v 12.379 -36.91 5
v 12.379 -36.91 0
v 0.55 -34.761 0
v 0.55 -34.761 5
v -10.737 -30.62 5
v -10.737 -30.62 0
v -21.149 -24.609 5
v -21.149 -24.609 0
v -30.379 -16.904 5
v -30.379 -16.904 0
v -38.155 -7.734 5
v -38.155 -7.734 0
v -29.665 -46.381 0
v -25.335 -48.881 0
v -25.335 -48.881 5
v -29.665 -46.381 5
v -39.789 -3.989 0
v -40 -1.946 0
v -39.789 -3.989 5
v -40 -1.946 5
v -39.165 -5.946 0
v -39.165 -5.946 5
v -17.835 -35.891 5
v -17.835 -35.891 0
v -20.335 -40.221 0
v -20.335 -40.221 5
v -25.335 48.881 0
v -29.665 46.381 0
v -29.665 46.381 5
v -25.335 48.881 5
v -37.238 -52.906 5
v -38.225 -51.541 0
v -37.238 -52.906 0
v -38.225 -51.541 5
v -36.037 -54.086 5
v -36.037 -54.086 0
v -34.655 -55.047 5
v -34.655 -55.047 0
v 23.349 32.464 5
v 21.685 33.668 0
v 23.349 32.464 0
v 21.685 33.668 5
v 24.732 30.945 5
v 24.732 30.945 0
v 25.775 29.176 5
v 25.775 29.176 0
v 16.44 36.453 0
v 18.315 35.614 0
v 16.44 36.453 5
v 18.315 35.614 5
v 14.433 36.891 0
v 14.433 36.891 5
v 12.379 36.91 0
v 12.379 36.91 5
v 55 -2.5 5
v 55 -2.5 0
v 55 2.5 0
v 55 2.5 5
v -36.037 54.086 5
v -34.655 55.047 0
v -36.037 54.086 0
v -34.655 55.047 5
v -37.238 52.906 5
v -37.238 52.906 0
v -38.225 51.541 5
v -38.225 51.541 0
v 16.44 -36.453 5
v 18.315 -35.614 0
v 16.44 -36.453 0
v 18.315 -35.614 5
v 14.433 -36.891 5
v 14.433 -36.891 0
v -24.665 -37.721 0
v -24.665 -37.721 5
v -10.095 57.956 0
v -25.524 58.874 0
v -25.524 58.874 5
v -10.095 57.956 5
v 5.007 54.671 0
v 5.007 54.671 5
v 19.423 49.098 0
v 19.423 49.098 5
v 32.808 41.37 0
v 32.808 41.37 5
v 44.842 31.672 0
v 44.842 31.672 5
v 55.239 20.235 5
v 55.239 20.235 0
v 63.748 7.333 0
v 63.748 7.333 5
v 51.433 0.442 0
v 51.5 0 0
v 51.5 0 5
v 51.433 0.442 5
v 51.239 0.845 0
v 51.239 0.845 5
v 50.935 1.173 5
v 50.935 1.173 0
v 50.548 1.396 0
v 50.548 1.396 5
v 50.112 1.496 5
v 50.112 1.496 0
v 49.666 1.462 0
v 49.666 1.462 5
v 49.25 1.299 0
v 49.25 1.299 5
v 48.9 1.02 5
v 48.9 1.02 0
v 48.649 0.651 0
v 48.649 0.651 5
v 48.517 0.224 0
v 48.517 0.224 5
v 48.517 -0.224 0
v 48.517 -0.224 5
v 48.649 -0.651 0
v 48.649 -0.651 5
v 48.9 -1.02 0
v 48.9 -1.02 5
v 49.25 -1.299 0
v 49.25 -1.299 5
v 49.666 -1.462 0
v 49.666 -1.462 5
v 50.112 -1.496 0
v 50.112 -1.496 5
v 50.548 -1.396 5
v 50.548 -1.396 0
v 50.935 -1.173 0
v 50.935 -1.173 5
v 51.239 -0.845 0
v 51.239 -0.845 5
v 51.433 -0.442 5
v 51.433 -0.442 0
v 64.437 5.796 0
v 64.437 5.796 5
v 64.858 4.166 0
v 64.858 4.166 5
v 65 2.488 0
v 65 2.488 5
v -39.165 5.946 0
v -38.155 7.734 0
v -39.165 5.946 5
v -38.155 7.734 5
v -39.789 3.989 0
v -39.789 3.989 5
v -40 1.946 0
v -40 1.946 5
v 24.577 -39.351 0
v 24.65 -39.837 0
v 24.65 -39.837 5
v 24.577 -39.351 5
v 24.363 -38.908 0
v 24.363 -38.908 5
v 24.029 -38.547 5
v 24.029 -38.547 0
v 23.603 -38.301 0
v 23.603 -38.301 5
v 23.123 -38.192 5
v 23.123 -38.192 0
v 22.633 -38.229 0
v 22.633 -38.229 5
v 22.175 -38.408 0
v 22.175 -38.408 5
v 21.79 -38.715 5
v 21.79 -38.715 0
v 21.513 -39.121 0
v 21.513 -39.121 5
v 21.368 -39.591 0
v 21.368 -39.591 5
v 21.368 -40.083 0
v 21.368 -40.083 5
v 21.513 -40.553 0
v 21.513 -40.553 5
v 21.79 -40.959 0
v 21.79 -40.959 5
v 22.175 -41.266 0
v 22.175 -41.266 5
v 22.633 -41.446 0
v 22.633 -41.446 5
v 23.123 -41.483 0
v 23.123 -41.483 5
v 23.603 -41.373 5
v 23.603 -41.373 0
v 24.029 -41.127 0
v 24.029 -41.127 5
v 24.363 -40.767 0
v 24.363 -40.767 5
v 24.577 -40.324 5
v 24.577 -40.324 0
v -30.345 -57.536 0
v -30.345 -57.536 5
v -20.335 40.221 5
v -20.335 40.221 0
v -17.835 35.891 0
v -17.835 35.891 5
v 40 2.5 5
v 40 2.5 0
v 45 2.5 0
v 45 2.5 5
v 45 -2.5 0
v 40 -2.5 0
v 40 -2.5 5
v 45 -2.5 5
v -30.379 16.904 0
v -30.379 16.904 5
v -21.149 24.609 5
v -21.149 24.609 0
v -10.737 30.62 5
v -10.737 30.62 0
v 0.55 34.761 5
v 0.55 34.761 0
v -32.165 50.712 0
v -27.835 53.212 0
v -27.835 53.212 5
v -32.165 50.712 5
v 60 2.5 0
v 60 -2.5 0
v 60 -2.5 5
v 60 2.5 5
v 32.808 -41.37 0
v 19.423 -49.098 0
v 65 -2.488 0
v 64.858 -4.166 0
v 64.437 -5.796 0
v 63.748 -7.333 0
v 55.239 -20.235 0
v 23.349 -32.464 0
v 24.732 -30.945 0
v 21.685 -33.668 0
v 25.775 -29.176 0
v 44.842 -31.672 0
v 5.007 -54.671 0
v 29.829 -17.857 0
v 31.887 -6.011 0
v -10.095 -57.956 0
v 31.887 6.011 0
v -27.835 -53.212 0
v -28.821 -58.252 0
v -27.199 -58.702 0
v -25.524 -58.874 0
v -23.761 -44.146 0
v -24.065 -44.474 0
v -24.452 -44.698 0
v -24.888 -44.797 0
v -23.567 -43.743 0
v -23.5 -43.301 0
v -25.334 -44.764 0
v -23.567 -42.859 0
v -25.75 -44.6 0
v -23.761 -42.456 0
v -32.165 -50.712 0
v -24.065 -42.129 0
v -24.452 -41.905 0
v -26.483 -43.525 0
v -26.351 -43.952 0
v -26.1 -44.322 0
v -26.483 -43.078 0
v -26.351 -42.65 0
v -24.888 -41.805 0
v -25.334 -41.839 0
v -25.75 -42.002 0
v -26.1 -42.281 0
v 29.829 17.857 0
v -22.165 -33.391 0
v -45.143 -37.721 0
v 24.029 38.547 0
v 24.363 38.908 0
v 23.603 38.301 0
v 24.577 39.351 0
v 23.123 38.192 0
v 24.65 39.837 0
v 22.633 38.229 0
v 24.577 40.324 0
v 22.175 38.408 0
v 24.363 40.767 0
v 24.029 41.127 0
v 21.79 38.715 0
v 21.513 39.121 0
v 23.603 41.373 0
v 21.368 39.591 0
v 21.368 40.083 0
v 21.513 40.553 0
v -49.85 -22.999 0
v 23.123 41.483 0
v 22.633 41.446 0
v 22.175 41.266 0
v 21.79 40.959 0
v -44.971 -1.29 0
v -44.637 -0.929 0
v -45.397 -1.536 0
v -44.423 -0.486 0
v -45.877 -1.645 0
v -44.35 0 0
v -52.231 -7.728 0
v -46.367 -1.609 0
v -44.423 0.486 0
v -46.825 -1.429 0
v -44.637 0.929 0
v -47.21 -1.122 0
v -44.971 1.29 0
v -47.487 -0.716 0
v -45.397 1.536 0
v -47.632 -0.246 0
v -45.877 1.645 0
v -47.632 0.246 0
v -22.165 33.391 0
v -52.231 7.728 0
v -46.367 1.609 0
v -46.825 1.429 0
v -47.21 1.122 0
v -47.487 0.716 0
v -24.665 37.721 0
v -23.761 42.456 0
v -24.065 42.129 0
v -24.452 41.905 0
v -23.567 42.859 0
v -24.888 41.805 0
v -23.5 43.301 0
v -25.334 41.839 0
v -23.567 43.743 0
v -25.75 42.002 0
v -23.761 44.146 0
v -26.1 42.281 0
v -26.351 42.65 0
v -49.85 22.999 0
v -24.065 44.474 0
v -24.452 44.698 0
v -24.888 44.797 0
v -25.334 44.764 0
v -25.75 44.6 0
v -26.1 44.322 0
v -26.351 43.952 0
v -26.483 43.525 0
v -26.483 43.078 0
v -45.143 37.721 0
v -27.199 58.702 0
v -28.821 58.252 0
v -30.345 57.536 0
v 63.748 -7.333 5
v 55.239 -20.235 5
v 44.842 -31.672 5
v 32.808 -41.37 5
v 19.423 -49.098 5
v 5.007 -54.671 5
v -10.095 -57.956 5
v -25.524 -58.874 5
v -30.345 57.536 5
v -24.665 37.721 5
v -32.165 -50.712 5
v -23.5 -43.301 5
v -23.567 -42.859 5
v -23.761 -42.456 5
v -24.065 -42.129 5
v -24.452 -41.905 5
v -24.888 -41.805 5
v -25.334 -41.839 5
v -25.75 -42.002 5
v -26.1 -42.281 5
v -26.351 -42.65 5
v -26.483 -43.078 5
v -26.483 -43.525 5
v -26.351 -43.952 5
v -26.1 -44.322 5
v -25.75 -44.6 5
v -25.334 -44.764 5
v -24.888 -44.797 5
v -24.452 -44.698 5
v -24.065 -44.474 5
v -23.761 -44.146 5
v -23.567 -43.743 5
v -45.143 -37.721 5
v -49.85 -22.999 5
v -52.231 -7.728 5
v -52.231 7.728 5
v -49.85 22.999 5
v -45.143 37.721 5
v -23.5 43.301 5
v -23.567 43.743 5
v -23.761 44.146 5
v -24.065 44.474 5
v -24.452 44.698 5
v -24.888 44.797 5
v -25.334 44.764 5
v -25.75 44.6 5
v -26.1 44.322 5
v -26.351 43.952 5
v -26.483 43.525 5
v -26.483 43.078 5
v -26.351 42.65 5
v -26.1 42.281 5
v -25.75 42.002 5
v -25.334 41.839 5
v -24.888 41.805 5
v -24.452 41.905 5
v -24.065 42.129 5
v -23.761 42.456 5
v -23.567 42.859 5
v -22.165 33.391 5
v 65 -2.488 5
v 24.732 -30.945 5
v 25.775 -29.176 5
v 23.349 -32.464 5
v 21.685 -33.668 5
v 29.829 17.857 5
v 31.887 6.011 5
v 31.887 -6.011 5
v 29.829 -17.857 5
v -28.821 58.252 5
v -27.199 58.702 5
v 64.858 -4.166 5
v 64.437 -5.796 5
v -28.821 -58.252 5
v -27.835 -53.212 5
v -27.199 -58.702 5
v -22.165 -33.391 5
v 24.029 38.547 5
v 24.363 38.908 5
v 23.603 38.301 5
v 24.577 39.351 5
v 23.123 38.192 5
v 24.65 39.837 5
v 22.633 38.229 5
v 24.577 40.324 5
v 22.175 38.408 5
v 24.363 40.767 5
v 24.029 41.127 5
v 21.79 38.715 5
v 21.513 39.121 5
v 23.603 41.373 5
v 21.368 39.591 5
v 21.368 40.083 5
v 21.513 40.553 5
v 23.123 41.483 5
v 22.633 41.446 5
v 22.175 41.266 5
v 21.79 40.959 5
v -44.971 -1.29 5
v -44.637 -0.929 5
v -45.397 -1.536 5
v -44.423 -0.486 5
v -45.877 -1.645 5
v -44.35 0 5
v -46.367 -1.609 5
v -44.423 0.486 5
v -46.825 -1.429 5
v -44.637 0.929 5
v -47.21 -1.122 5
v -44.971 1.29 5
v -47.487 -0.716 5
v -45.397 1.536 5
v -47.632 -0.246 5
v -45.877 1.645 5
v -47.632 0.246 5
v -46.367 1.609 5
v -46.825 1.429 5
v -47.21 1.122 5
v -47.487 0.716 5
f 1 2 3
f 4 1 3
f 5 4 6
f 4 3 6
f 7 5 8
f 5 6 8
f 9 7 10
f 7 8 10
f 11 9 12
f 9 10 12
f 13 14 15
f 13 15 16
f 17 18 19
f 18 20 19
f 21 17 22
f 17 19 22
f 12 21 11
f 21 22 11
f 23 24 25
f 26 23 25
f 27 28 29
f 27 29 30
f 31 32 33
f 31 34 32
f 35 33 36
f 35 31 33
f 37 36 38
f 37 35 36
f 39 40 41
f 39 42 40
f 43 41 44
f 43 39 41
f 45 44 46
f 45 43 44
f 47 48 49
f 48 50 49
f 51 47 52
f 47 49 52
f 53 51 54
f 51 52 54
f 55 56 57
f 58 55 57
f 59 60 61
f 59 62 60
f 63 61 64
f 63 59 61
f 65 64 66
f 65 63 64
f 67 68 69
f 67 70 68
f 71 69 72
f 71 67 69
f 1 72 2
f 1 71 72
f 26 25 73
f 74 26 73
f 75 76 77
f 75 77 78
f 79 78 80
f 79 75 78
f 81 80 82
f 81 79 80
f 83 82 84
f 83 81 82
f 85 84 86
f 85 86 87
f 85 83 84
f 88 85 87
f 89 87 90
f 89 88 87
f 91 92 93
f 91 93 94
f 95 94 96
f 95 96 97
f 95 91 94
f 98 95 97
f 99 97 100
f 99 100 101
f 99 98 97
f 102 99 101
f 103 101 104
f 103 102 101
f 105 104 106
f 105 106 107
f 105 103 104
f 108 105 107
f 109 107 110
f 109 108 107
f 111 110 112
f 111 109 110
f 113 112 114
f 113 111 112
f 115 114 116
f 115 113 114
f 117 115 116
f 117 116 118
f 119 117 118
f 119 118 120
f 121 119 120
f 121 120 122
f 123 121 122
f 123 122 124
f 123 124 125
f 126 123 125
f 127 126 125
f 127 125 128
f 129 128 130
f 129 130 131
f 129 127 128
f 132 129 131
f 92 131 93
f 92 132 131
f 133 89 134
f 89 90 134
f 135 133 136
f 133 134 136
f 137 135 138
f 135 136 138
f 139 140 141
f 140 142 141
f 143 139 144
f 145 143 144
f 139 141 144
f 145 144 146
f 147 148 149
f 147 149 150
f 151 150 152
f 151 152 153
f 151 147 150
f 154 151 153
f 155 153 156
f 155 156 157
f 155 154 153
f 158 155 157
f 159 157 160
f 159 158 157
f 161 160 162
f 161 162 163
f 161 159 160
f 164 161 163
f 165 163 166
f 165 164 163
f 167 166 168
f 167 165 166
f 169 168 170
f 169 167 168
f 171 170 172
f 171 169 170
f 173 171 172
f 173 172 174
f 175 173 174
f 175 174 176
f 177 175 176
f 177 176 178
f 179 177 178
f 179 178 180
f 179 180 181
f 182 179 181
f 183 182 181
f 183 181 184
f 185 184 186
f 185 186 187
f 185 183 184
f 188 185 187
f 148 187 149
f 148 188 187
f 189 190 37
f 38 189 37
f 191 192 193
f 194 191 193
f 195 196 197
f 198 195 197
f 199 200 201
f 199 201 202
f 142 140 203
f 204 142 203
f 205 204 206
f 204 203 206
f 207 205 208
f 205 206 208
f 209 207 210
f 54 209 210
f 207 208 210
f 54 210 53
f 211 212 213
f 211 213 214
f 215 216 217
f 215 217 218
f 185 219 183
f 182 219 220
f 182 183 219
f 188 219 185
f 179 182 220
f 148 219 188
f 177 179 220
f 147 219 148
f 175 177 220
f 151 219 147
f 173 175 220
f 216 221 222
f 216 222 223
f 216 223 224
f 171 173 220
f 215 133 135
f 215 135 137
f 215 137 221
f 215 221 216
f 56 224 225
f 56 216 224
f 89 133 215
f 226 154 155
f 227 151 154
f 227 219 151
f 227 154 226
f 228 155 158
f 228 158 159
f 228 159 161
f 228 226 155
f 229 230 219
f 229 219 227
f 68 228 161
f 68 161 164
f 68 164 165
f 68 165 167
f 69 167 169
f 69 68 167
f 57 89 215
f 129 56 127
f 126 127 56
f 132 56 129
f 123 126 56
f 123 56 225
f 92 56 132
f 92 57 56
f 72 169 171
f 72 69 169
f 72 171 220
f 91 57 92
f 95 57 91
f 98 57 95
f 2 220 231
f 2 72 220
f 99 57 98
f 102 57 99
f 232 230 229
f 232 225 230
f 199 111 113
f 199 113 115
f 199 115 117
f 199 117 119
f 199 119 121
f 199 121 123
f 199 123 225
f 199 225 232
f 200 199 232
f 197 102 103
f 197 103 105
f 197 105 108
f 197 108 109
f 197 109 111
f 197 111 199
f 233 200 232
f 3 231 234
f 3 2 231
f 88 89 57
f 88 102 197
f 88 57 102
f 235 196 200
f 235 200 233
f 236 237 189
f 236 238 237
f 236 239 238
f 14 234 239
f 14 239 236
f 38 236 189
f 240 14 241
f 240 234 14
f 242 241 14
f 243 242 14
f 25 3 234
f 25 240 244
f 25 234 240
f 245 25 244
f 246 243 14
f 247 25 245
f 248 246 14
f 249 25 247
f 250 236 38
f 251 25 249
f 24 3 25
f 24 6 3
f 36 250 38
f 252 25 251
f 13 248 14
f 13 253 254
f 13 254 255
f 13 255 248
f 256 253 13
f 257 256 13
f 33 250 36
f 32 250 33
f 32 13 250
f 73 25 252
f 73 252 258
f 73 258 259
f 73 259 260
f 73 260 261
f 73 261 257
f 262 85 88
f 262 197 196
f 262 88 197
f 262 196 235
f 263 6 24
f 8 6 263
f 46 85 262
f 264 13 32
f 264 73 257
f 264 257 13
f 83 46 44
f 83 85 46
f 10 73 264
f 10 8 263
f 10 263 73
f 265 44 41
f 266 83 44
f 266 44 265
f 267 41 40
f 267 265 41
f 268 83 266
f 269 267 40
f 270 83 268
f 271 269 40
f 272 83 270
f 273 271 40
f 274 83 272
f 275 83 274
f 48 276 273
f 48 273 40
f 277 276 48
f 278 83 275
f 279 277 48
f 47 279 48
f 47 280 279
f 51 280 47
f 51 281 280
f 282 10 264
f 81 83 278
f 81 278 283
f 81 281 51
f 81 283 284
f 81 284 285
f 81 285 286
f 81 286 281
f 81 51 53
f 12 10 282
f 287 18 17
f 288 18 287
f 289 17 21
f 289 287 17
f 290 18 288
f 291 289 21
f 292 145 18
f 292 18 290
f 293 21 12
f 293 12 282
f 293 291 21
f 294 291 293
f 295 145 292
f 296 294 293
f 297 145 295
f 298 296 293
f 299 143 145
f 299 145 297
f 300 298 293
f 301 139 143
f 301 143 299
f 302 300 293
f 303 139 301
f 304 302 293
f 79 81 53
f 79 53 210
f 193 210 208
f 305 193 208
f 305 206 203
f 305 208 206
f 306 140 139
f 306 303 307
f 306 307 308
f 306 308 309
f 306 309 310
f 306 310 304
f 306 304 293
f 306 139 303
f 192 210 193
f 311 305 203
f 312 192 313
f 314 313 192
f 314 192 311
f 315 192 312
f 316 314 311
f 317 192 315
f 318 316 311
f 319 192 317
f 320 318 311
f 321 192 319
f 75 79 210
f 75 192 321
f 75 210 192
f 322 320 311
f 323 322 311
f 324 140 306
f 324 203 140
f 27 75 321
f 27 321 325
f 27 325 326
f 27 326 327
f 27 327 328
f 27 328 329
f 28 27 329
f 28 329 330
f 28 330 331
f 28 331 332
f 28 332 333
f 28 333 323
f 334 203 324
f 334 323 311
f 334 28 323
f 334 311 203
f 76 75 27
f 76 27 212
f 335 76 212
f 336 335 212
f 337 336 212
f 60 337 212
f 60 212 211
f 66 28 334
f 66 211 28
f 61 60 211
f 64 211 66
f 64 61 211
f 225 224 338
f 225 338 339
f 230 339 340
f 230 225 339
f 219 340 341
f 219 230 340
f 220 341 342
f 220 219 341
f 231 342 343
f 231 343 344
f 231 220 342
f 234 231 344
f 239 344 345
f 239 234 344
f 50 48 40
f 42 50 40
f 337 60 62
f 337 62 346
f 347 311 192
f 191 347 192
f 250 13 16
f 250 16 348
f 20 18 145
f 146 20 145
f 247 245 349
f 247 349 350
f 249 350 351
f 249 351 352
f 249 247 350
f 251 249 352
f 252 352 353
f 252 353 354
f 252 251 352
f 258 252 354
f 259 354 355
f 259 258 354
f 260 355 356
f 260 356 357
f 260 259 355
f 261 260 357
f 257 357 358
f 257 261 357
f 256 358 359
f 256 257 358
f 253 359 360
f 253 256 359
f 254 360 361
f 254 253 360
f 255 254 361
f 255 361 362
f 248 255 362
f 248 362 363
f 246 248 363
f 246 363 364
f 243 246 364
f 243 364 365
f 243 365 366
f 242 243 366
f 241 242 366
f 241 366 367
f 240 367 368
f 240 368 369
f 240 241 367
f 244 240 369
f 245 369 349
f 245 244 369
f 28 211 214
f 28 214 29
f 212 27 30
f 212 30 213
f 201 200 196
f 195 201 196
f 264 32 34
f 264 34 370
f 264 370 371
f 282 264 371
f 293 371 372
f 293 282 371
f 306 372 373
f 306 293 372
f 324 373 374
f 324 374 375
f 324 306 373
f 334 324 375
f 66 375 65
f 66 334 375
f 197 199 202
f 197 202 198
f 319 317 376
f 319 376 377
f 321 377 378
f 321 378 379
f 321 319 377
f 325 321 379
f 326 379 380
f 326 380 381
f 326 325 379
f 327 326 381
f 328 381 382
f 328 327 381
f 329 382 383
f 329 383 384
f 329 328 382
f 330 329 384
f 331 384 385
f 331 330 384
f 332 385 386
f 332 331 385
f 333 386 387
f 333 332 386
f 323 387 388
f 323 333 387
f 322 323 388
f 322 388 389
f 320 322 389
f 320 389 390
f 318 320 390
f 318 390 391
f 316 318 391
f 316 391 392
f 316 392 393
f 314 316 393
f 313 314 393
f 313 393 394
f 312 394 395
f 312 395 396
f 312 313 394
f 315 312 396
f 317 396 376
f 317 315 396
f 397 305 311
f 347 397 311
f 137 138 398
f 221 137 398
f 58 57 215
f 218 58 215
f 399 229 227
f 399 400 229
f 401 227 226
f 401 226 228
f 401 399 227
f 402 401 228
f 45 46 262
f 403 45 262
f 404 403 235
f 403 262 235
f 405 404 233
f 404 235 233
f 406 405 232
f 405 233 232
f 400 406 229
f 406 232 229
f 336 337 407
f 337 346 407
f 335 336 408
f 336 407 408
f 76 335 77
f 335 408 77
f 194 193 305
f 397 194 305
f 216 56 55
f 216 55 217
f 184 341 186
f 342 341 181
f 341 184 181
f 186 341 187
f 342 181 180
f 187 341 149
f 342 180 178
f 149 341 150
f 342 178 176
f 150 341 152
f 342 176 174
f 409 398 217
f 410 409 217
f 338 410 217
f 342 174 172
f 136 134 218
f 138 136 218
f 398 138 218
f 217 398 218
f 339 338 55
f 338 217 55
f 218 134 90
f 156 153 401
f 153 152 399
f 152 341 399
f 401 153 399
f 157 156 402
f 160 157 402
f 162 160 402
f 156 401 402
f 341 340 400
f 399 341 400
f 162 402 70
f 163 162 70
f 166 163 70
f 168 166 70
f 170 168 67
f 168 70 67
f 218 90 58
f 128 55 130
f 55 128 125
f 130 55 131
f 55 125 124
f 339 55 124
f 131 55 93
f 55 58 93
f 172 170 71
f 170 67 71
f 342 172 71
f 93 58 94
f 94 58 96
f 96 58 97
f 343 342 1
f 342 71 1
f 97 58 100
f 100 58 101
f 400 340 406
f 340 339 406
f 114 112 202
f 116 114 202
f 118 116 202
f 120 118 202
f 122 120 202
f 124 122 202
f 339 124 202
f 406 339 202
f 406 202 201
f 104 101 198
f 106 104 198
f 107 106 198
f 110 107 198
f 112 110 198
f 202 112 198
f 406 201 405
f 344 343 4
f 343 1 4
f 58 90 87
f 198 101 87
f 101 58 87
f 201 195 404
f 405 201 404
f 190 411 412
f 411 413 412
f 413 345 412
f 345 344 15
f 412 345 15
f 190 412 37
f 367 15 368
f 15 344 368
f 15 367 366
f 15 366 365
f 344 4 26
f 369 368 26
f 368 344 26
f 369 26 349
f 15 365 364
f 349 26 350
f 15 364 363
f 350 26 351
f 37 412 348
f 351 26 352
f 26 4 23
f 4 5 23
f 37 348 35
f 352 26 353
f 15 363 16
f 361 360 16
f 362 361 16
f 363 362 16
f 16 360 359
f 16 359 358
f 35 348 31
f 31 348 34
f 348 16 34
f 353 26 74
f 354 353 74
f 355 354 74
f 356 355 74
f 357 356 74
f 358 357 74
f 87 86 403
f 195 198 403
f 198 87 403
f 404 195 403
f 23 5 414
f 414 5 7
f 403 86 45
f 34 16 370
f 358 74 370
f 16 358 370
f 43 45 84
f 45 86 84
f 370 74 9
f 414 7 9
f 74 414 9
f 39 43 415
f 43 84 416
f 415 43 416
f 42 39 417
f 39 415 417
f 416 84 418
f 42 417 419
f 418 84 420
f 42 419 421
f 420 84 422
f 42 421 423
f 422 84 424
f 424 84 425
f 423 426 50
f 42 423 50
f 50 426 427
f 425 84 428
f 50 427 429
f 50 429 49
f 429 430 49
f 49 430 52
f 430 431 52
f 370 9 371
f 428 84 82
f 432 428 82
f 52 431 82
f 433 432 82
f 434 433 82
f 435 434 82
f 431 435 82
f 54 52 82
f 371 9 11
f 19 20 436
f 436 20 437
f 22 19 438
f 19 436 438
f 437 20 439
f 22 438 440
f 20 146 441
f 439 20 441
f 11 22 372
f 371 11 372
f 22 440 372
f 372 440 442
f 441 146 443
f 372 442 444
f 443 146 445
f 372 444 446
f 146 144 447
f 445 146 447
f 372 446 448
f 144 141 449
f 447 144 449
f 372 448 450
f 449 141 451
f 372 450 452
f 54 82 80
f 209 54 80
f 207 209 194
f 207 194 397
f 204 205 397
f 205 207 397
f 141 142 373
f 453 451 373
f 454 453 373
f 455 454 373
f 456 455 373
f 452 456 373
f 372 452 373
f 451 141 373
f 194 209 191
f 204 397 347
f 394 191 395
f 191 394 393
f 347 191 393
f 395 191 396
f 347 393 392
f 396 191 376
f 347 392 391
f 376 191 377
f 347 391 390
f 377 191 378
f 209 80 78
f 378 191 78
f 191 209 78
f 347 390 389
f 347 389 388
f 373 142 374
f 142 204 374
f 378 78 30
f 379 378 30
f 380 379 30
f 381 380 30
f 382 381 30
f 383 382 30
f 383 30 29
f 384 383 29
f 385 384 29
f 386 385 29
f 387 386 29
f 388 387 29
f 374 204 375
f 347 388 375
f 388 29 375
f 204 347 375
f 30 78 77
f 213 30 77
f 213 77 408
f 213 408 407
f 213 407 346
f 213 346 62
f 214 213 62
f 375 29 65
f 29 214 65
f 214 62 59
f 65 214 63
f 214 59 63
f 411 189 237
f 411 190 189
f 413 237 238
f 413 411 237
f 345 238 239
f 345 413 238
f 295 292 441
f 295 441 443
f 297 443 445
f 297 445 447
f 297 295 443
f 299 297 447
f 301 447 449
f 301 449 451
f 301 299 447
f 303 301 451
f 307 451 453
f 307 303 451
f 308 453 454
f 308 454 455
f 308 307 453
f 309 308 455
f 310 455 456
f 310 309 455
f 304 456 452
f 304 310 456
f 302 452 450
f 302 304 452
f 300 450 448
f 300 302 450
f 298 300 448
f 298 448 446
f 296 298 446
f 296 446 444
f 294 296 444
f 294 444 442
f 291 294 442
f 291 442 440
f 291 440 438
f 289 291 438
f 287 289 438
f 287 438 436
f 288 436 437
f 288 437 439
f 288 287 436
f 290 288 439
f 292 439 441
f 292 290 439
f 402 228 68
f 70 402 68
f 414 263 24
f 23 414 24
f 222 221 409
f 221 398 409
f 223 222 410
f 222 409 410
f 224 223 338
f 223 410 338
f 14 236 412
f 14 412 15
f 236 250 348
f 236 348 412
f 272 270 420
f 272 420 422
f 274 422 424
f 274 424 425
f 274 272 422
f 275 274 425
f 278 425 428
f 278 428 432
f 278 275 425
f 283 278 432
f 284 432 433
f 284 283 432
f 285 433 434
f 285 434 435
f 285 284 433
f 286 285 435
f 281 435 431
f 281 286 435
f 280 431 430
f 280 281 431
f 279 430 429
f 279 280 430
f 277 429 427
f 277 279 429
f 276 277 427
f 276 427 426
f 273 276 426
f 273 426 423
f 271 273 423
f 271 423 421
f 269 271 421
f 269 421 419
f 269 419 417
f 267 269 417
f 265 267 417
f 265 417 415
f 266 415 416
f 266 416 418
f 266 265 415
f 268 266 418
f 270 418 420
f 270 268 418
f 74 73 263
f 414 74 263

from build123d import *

# Parameters (mm, degrees)
ESQUISSE1_R        = 1.65
ESQUISSE1_R_2      = 1.5
ESQUISSE1_W        = 5
ESQUISSE1_H        = 5
BOSS_EXTRU_1_DEPTH = 5
FILLET1_R          = 10


with BuildPart() as part:
    # Esquisse1 → Boss.-Extru.1 (new body)
    with BuildSketch(Plane.XY):
        with BuildLine():
            Line((-36.830127019, 53.791651246), (-28.169872981, 58.791651246))
            ThreePointArc((-28.169872981, 58.791651246), (26.265157649, 45.492587517), (65, 5))
            Line((65, 5), (65, -5))
            ThreePointArc((65, -5), (26.265157649, -45.492587517), (-28.169872981, -58.791651246))
            Line((-28.169872981, -58.791651246), (-36.830127019, -53.791651246))
            ThreePointArc((-36.830127019, -53.791651246), (-52.530315298, 0), (-36.830127019, 53.791651246))
        make_face()
        with Locations((23, 39.837168574)):
            Circle(ESQUISSE1_R, mode=Mode.SUBTRACT)
        with Locations((23, -39.837168574)):
            Circle(ESQUISSE1_R, mode=Mode.SUBTRACT)
        with Locations((-46, 0)):
            Circle(ESQUISSE1_R, mode=Mode.SUBTRACT)
        with Locations((50, 0)):
            Circle(ESQUISSE1_R_2, mode=Mode.SUBTRACT)
        with Locations((-25, 43.301270189)):
            Circle(ESQUISSE1_R_2, mode=Mode.SUBTRACT)
        with Locations((-25, -43.301270189)):
            Circle(ESQUISSE1_R_2, mode=Mode.SUBTRACT)
        with BuildLine():
            Line((15.669872981, 37.141016151), (24.330127019, 32.141016151))
            ThreePointArc((24.330127019, 32.141016151), (32.145280949, 0), (24.330127019, -32.141016151))
            Line((24.330127019, -32.141016151), (15.669872981, -37.141016151))
            ThreePointArc((15.669872981, -37.141016151), (-16.072640474, -27.838629914), (-40, -5))
            Line((-40, -5), (-40, 5))
            ThreePointArc((-40, 5), (-16.072640474, 27.838629914), (15.669872981, 37.141016151))
        make_face(mode=Mode.SUBTRACT)
        with Locations((42.5, 0)):
            Rectangle(ESQUISSE1_W, ESQUISSE1_H, mode=Mode.SUBTRACT)
        with Locations((57.5, 0)):
            Rectangle(ESQUISSE1_W, ESQUISSE1_H, mode=Mode.SUBTRACT)
        Polygon((-25.334936491, 48.881397208), (-27.834936491, 53.211524227), (-32.165063509, 50.711524227), (-29.665063509, 46.381397208), align=None, mode=Mode.SUBTRACT)
        Polygon((-20.334936491, 40.22114317), (-17.834936491, 35.891016151), (-22.165063509, 33.391016151), (-24.665063509, 37.72114317), align=None, mode=Mode.SUBTRACT)
        Polygon((-29.665063509, -46.381397208), (-32.165063509, -50.711524227), (-27.834936491, -53.211524227), (-25.334936491, -48.881397208), align=None, mode=Mode.SUBTRACT)
        Polygon((-24.665063509, -37.72114317), (-22.165063509, -33.391016151), (-17.834936491, -35.891016151), (-20.334936491, -40.22114317), align=None, mode=Mode.SUBTRACT)
    extrude(amount=BOSS_EXTRU_1_DEPTH)

    # Fillet1
    fillet1_edges = [part.edges().sort_by_distance(p)[0] for p in [
        (-36.830127019, 53.791651246, 2.5),
        (-28.169872981, 58.791651246, 2.5),
        (65, 5, 2.5),
        (65, -5, 2.5),
        (-28.169872981, -58.791651246, 2.5),
        (-36.830127019, -53.791651246, 2.5),
        (15.669872981, 37.141016151, 2.5),
        (-40, 5, 2.5),
        (-40, -5, 2.5),
        (15.669872981, -37.141016151, 2.5),
        (24.330127019, -32.141016151, 2.5),
        (24.330127019, 32.141016151, 2.5),
    ]]
    fillet(fillet1_edges, radius=FILLET1_R)


solid = part.part
